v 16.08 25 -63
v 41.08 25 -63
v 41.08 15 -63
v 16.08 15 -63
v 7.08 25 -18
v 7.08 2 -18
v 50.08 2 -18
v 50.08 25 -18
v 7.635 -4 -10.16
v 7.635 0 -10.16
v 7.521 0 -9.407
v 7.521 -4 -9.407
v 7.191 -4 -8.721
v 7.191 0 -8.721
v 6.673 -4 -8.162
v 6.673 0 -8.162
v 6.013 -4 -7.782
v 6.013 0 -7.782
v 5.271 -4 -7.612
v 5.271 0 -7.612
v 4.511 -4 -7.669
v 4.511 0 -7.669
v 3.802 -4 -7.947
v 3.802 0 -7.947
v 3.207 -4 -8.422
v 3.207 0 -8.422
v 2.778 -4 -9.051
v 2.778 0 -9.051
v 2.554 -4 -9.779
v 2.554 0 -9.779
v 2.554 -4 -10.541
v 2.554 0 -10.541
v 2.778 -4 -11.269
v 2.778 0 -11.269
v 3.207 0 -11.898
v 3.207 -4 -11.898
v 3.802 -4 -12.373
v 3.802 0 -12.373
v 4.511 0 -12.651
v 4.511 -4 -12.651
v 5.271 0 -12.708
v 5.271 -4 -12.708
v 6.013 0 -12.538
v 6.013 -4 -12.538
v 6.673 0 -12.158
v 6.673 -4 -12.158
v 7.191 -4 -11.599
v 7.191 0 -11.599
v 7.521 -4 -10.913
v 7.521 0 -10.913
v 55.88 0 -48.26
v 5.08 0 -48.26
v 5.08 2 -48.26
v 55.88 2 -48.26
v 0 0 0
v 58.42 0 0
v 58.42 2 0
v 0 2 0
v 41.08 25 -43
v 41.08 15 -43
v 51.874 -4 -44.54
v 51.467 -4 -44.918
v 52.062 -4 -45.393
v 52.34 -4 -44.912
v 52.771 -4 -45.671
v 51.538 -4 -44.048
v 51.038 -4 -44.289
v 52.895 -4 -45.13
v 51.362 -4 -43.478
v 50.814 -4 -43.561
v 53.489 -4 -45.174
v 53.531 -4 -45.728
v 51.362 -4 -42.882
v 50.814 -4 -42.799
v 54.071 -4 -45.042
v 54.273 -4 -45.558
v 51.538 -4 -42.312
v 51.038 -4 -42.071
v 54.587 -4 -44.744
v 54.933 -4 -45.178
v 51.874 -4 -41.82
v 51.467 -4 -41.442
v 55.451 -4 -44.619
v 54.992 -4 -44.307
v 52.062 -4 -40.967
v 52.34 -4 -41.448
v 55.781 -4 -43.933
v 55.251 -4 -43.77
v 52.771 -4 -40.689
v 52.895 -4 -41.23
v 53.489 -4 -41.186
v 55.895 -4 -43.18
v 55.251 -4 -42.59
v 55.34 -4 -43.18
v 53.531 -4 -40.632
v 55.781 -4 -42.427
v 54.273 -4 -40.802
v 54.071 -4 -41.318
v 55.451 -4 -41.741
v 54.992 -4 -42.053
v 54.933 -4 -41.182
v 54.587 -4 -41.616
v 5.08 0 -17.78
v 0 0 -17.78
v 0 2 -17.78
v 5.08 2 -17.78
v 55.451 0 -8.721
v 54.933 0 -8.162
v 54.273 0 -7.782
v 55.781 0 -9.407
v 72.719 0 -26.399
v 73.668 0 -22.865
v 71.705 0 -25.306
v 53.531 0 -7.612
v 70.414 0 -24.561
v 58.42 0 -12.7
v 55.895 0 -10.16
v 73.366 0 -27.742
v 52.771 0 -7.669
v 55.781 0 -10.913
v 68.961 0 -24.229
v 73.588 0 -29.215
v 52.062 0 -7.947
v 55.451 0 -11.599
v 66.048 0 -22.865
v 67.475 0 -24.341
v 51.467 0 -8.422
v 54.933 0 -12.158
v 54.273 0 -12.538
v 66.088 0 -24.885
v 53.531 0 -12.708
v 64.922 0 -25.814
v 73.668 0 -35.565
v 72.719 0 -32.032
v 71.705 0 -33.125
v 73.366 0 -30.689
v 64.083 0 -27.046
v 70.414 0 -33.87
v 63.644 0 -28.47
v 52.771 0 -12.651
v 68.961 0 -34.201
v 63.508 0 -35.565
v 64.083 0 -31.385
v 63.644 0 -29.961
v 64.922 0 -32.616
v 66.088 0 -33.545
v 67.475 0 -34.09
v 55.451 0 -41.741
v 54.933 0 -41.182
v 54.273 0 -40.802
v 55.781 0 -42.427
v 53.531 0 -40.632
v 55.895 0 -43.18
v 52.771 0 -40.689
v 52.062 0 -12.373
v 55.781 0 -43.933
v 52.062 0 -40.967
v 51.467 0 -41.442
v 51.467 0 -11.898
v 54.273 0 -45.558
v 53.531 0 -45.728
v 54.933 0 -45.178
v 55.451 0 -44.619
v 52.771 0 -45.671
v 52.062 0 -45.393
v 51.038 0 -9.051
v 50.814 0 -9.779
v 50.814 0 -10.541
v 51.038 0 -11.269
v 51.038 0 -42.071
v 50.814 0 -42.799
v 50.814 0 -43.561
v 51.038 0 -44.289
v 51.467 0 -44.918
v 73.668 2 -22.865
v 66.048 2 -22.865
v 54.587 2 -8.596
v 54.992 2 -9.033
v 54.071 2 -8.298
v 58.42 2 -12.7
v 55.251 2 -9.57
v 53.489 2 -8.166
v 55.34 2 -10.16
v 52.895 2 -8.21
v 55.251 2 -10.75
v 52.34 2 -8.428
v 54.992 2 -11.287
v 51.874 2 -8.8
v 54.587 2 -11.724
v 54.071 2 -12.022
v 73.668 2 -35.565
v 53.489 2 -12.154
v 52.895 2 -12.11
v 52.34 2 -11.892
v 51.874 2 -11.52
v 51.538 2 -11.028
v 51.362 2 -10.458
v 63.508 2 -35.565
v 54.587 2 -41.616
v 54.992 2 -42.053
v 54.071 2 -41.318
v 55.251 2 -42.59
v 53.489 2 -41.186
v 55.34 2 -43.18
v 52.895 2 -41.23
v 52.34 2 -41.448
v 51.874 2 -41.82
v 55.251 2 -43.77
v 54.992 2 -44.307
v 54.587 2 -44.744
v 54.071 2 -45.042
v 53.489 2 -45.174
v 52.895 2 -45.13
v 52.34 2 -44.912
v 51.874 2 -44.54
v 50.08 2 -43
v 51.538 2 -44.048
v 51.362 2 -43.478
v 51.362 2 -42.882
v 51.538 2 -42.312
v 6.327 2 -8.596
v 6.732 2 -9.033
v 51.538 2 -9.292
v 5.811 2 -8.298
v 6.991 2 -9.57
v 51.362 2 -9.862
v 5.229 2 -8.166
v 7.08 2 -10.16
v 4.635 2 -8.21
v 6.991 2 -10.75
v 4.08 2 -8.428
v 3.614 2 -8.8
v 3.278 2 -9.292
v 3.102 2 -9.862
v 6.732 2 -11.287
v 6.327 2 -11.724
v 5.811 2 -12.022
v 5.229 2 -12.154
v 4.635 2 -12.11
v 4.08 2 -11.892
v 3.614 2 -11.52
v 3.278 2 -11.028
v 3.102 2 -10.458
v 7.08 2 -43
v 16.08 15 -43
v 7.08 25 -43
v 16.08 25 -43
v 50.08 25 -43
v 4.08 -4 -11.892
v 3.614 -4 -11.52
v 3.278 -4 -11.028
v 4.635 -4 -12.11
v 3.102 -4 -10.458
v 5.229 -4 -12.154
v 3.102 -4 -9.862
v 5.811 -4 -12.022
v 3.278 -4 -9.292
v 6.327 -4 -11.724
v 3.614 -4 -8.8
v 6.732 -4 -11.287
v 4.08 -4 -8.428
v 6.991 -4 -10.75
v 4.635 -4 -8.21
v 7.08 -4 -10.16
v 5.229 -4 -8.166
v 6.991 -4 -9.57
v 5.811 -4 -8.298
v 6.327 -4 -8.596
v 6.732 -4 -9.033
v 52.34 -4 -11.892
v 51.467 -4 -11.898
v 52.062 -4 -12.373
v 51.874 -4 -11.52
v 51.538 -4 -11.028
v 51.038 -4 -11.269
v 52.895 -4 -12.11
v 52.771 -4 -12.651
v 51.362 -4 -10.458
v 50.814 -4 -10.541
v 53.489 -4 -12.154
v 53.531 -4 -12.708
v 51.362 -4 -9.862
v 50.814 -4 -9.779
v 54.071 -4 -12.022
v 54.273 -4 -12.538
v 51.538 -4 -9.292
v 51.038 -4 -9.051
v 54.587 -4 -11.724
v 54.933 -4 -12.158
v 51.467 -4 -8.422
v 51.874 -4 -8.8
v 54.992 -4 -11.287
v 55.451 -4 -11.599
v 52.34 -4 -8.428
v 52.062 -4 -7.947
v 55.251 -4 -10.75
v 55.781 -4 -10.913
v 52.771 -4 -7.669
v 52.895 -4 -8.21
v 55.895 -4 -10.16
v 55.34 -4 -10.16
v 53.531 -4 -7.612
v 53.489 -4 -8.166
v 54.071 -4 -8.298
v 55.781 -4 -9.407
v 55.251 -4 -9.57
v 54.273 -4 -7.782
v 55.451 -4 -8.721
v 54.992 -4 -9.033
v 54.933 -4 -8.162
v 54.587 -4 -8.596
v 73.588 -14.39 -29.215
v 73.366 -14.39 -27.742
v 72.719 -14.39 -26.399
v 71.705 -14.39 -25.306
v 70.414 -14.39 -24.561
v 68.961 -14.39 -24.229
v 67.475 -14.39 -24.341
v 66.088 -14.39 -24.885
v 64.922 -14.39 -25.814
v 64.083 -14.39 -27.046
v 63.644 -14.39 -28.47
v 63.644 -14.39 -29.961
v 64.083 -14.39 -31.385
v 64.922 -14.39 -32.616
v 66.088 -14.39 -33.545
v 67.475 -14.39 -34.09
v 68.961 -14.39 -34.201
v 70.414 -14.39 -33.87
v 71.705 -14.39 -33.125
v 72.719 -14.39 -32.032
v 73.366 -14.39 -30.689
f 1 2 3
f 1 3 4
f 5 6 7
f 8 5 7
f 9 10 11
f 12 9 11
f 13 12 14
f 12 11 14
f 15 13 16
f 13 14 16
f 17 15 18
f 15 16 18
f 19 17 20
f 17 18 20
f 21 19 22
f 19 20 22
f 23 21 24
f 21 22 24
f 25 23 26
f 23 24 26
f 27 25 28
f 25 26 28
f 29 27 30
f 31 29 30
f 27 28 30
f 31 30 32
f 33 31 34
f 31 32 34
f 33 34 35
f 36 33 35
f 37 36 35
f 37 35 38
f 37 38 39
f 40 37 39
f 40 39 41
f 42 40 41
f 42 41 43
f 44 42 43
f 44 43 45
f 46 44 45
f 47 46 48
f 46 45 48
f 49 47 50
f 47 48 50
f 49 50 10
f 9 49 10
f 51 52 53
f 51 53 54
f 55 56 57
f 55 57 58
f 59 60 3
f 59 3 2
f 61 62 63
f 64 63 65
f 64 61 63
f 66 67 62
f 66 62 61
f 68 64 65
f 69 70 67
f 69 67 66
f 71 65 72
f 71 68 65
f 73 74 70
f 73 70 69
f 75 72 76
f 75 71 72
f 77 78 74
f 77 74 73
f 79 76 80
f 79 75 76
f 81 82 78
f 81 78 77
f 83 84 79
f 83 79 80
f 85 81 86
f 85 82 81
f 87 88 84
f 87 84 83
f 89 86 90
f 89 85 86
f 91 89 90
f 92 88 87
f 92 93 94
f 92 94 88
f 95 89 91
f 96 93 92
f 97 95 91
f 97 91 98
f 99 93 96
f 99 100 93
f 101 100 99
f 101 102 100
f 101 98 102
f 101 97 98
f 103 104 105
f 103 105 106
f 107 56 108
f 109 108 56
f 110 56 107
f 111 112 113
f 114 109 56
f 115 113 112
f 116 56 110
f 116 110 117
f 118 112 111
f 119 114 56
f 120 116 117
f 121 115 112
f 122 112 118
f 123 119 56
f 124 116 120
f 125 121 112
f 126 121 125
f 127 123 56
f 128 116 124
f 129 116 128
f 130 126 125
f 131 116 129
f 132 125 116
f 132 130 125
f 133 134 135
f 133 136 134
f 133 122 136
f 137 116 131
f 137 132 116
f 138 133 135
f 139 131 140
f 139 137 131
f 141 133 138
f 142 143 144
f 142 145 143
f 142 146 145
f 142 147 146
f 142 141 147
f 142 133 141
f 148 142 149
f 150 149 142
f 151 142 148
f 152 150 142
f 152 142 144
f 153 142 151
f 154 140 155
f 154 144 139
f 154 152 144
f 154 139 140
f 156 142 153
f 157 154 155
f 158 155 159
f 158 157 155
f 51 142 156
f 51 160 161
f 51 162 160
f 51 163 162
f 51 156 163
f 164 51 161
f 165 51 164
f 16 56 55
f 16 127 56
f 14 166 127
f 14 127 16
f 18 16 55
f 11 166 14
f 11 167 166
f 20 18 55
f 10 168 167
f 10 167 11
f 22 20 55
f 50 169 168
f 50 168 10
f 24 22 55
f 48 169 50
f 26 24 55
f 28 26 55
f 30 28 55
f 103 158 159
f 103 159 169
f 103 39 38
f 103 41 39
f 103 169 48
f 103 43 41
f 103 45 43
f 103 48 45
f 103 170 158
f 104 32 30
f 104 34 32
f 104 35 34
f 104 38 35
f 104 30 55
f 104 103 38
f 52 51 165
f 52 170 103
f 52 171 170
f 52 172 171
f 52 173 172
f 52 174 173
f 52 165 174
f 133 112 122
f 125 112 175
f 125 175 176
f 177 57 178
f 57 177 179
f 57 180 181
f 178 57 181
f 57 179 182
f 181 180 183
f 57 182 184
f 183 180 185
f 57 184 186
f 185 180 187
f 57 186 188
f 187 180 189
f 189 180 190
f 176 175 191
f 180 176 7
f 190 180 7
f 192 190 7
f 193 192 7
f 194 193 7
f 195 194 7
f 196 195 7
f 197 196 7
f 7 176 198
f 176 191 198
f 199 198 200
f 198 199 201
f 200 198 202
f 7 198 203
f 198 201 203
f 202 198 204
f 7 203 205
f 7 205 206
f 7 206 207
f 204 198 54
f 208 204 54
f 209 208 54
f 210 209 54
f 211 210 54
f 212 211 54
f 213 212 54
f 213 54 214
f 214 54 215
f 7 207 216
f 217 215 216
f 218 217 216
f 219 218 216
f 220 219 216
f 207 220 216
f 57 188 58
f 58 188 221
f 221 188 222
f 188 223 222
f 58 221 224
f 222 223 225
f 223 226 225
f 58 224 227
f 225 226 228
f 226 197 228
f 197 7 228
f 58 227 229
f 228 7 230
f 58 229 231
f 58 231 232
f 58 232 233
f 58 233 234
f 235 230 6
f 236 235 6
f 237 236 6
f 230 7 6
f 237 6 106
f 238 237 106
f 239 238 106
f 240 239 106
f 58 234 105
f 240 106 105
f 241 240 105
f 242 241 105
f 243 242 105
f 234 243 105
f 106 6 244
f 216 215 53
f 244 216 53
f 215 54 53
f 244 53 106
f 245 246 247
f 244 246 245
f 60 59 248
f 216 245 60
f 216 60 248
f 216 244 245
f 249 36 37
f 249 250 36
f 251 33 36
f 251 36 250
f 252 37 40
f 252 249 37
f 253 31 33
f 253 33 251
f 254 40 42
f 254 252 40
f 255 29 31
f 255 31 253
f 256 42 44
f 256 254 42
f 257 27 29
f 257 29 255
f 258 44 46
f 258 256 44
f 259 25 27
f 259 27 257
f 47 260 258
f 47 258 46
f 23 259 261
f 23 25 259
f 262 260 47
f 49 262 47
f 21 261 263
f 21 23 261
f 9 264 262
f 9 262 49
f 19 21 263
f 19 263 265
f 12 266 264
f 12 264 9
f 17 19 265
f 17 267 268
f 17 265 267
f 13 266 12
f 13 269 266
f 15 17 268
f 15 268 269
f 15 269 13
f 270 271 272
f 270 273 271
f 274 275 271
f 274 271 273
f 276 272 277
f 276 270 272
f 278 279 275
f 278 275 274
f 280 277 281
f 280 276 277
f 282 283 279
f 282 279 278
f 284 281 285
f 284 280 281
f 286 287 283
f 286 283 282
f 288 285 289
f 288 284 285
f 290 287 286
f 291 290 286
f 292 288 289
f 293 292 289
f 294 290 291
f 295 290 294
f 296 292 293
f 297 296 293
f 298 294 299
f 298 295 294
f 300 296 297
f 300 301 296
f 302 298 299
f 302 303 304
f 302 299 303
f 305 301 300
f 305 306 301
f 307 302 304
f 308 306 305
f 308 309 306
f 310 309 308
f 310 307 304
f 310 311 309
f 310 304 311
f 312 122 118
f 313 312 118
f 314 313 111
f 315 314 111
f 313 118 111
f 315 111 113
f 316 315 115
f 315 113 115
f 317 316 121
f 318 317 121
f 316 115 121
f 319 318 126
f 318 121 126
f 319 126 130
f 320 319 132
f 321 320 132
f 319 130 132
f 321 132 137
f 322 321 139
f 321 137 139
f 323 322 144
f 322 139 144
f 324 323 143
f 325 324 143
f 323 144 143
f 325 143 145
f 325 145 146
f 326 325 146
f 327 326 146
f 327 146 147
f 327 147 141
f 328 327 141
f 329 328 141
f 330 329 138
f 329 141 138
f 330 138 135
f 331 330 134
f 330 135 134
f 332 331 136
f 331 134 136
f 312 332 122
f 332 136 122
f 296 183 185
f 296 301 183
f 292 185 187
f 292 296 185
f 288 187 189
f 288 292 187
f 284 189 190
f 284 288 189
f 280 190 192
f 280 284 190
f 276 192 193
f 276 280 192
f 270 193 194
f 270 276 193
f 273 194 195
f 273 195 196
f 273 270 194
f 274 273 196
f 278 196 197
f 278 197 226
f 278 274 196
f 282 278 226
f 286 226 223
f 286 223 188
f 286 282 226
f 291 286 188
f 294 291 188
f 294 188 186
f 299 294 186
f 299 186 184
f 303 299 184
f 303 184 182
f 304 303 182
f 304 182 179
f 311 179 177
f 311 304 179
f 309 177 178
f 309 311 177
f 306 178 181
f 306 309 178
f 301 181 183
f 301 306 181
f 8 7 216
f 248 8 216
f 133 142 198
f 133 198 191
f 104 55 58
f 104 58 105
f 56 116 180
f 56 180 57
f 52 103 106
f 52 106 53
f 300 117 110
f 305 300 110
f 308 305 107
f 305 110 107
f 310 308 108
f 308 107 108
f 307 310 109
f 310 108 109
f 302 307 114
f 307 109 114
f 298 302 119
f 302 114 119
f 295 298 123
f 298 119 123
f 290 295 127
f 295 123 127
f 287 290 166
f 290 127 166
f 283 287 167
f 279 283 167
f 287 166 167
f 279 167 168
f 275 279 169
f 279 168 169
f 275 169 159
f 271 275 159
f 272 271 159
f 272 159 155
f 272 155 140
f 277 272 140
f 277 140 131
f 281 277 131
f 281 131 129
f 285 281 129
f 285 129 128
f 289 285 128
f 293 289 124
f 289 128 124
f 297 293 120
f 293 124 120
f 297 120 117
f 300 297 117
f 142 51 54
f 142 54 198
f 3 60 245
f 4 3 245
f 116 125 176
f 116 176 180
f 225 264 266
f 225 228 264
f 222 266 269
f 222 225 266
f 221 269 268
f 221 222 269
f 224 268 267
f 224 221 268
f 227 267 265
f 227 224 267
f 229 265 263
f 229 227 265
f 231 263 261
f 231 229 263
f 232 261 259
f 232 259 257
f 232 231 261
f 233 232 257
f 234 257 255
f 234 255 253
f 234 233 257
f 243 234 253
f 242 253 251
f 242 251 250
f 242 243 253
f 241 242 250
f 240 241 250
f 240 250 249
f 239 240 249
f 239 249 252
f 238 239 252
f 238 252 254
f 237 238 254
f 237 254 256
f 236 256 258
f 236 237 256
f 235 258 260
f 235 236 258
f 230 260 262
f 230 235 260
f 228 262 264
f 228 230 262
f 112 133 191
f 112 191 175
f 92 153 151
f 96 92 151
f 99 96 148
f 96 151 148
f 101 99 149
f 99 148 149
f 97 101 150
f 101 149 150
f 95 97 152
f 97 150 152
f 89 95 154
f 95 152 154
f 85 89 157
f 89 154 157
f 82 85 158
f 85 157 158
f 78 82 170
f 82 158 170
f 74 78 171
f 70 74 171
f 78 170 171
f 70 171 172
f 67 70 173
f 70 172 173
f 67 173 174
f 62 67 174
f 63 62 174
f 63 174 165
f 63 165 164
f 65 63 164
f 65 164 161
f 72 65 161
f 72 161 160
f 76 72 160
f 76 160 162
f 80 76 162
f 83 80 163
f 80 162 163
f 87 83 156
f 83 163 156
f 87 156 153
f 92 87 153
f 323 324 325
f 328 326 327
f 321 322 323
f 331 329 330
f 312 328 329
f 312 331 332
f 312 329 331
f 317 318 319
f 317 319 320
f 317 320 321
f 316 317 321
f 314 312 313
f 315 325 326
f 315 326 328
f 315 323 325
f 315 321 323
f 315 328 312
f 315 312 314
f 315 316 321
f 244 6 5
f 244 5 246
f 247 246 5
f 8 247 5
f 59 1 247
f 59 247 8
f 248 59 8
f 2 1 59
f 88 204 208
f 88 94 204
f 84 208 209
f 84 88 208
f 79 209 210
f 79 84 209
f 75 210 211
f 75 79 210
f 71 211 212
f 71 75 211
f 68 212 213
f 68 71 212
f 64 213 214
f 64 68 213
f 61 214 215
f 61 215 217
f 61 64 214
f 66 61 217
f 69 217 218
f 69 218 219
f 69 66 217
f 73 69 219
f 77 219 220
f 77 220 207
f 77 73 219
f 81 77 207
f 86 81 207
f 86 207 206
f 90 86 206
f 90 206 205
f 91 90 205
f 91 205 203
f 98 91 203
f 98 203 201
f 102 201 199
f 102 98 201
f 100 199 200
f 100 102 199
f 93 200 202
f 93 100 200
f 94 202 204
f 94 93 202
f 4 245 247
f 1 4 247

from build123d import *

# Parameters (mm, degrees)
SKETCH1_R           = 2
BOSS_EXTRUDE1_DEPTH = 2
SKETCH2_W           = 43
SKETCH2_H           = 25
BOSS_EXTRUDE2_DEPTH = 23
SKETCH4_R           = 5
BOSS_EXTRUDE3_DEPTH = 14.39
SKETCH5_R           = 2.555
SKETCH5_R_2         = 2
BOSS_EXTRUDE4_DEPTH = 4
SKETCH6_W           = 25
SKETCH6_H           = 10
BOSS_EXTRUDE5_DEPTH = 20


with BuildPart() as part:
    # Sketch1 → Boss-Extrude1 (new body)
    with BuildSketch(Plane(origin=(0, 0, 0), x_dir=(1, 0, 0), z_dir=(0, 1, 0))):
        Polygon((55.88, 48.26), (63.507713889, 35.565352277), (73.667713889, 35.565352277), (73.667713889, 22.865352277), (66.047713889, 22.865352277), (58.42, 12.7), (58.42, 0), (0, 0), (0, 17.78), (5.08, 17.78), (5.08, 48.26), align=None)
        with Locations((5.08, 10.16)):
            Circle(SKETCH1_R, mode=Mode.SUBTRACT)
        with Locations((53.34, 10.16)):
            Circle(SKETCH1_R, mode=Mode.SUBTRACT)
        with Locations((53.34, 43.18)):
            Circle(SKETCH1_R, mode=Mode.SUBTRACT)
    extrude(amount=BOSS_EXTRUDE1_DEPTH)

    # Sketch2 → Boss-Extrude2 (add)
    with BuildSketch(Plane(origin=(0, 2, 0), x_dir=(1, 0, 0), z_dir=(0, 1, 0))):
        with Locations((28.58, 30.5)):
            Rectangle(SKETCH2_W, SKETCH2_H)
    extrude(amount=BOSS_EXTRUDE2_DEPTH)

    # Sketch4 → Boss-Extrude3 (add)
    with BuildSketch(Plane.XZ):
        with Locations((68.587713889, -29.215352277)):
            Circle(SKETCH4_R)
    extrude(amount=BOSS_EXTRUDE3_DEPTH)

    # Sketch5 → Boss-Extrude4 (add)
    with BuildSketch(Plane.XZ):
        with Locations((5.08, -10.16)):
            Circle(SKETCH5_R)
        with Locations((5.08, -10.16)):
            Circle(SKETCH5_R_2, mode=Mode.SUBTRACT)
        with Locations((53.34, -10.16)):
            Circle(SKETCH5_R)
        with Locations((53.34, -10.16)):
            Circle(SKETCH5_R_2, mode=Mode.SUBTRACT)
        with Locations((53.34, -43.18)):
            Circle(SKETCH5_R)
        with Locations((53.34, -43.18)):
            Circle(SKETCH5_R_2, mode=Mode.SUBTRACT)
    extrude(amount=BOSS_EXTRUDE4_DEPTH)

    # Sketch6 → Boss-Extrude5 (add)
    with BuildSketch(Plane(origin=(0, 0, -43), x_dir=(-1, 0, 0), z_dir=(0, 0, -1))):
        with Locations((-28.58, 20)):
            Rectangle(SKETCH6_W, SKETCH6_H)
    extrude(amount=BOSS_EXTRUDE5_DEPTH)


solid = part.part
